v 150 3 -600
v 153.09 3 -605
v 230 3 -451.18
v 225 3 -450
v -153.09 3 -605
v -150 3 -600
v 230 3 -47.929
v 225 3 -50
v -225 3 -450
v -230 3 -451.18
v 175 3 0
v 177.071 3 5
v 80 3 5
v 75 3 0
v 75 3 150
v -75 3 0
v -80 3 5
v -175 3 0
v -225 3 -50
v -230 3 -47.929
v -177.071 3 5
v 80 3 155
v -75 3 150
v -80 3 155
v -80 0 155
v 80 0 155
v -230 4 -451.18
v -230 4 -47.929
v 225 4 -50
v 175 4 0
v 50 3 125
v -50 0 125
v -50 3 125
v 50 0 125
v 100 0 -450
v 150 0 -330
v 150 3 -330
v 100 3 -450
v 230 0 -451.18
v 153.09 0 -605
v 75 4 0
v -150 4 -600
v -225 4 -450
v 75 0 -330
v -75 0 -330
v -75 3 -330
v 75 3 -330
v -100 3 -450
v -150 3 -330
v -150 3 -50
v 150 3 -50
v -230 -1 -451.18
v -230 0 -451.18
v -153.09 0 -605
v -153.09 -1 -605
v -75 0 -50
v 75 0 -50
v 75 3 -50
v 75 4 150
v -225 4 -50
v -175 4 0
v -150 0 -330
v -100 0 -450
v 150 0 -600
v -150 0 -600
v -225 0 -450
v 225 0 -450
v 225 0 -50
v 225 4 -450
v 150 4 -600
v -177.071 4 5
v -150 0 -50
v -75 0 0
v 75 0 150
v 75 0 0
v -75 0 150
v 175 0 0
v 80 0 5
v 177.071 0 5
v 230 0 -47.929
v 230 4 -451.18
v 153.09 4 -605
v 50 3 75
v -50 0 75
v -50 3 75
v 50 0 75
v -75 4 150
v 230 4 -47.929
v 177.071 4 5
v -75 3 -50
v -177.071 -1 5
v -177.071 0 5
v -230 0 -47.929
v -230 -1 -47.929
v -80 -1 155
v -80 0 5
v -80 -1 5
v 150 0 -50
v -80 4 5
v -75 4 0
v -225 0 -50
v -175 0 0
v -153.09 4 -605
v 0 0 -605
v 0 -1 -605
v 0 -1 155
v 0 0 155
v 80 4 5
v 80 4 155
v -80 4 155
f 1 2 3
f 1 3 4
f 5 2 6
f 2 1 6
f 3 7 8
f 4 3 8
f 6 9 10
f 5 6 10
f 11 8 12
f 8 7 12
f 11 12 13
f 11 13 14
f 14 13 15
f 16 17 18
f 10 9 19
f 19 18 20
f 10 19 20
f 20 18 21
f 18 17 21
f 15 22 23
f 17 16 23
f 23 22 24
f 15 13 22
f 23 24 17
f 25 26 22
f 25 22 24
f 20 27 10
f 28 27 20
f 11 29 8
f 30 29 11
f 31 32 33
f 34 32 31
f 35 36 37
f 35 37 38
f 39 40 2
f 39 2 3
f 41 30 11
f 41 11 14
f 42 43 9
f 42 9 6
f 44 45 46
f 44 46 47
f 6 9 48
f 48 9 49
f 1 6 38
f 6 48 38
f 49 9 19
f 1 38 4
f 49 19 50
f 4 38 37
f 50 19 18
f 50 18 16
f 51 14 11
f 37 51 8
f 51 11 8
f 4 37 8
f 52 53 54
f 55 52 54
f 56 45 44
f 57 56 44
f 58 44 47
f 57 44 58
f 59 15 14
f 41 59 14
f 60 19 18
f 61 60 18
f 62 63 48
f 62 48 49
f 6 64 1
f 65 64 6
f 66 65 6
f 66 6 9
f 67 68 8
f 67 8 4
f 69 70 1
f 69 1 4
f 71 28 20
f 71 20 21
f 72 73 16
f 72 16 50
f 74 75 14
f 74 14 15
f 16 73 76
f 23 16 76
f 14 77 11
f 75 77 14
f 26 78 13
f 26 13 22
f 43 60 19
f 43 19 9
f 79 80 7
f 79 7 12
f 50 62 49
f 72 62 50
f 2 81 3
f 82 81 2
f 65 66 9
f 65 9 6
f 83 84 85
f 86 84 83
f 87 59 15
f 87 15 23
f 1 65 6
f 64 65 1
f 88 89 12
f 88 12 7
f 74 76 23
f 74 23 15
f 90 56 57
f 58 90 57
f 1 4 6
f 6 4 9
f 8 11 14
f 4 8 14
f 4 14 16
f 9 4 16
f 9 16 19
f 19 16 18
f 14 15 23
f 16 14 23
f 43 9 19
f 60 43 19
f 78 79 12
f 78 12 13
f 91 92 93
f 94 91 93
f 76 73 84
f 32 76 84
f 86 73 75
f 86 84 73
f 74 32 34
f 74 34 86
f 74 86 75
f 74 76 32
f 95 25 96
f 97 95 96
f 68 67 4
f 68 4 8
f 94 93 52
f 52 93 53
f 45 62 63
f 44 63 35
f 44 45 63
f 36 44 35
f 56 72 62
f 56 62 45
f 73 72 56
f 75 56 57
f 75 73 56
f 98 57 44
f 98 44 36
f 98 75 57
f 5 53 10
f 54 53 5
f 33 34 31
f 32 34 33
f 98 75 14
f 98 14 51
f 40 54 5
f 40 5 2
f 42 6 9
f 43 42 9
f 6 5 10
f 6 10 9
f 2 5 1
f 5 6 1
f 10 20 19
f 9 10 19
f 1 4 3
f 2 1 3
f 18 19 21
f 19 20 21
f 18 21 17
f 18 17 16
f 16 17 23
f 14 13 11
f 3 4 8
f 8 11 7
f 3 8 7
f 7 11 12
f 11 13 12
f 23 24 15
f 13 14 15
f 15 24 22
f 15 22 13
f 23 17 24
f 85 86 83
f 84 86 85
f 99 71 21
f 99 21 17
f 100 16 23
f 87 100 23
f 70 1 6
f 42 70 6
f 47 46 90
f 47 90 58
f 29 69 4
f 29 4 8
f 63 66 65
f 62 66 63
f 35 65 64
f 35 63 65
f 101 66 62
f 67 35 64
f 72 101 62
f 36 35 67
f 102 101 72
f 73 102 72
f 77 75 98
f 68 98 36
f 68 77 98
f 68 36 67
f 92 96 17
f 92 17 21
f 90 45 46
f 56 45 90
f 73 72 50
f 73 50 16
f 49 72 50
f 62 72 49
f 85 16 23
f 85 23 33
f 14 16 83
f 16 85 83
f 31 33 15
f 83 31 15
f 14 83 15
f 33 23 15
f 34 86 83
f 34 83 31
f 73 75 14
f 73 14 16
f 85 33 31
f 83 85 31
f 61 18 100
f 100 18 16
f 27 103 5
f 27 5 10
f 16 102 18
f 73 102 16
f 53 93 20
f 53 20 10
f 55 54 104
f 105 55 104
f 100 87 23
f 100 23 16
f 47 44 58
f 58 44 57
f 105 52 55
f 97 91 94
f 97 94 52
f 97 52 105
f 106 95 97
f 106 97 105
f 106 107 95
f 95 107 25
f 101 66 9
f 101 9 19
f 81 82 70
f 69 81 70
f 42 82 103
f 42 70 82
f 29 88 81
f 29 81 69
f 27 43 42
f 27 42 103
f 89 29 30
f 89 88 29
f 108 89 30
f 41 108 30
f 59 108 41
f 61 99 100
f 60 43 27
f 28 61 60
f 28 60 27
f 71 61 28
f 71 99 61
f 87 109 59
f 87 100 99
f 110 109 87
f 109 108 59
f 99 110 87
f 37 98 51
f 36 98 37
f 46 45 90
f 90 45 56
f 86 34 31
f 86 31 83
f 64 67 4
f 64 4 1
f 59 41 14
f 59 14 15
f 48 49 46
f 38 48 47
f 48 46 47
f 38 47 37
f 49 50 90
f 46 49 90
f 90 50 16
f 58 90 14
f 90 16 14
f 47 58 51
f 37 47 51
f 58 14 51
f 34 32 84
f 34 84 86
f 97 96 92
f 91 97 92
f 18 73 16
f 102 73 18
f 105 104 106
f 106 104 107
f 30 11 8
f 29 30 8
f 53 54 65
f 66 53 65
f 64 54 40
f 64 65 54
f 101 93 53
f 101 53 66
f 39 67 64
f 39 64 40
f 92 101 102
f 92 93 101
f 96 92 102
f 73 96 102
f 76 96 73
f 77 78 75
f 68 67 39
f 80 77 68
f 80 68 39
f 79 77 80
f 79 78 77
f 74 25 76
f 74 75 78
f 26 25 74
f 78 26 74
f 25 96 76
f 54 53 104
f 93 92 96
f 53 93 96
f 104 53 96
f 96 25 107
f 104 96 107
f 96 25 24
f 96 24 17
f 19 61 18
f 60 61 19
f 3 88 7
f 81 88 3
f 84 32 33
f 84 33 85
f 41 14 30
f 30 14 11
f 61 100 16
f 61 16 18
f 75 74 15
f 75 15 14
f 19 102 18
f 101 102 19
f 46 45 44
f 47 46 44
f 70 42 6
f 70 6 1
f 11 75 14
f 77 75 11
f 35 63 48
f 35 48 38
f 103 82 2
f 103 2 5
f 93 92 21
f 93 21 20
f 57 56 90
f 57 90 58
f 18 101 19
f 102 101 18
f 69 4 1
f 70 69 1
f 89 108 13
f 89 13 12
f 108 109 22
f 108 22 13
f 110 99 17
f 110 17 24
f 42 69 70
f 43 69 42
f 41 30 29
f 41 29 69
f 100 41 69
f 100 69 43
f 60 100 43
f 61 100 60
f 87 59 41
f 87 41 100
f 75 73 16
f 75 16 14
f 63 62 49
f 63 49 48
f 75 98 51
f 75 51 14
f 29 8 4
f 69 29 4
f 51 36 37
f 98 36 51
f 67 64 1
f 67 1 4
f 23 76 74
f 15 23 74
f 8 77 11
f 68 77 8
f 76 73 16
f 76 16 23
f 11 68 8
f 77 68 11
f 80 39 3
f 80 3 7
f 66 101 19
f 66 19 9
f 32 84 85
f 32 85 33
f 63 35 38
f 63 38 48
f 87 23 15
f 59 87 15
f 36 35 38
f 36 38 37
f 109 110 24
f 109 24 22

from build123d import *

# Parameters (mm, degrees)
F1_DEPTH  = 3
F2_W      = 150
F2_H      = 150
F3_DEPTH  = 3
F4_W      = 150
F4_H      = 280
F5_DEPTH  = 3
F6_W      = 150
F6_H      = 280
F7_DEPTH  = 3
F9_DEPTH  = 3
F11_DEPTH = 3
F13_DEPTH = 1
F15_DEPTH = 1
F17_DEPTH = 1


with BuildPart() as f1:
    # F0 (on Front) → F1 (new body)
    with BuildSketch(Plane.XZ):
        Polygon((50, 125), (0, 125), (-50, 125), (-50, 100), (-50, 75), (0, 75), (50, 75), (50, 100), align=None)
    extrude(amount=-F1_DEPTH)


with BuildPart() as f3:
    # F2 (on Front) → F3 (new body)
    with BuildSketch(Plane.XZ):
        with Locations((0, 75)):
            Rectangle(F2_W, F2_H)
        Polygon((-50, 125), (0, 125), (50, 125), (50, 100), (50, 75), (0, 75), (-50, 75), (-50, 100), align=None, mode=Mode.SUBTRACT)
    extrude(amount=-F3_DEPTH)


with BuildPart() as f5:
    # F4 (on Front) → F5 (new body)
    with BuildSketch(Plane.XZ):
        with Locations((0, -190)):
            Rectangle(F4_W, F4_H)
    extrude(amount=-F5_DEPTH)


with BuildPart() as f7:
    # F6 (on Front) → F7 (new body)
    with BuildSketch(Plane.XZ):
        Polygon((75, 0), (-75, 0), (-150, -50), (-150, -330), (-100, -450), (100, -450), (150, -330), (150, -50), align=None)
        with Locations((0, -190)):
            Rectangle(F6_W, F6_H, mode=Mode.SUBTRACT)
    extrude(amount=-F7_DEPTH)


with BuildPart() as f9:
    # F8 (on face) → F9 (new body)
    with BuildSketch(Plane.XZ):
        Polygon((175, 0), (75, 0), (150, -50), (150, -330), (100, -450), (-100, -450), (-150, -330), (-150, -50), (-75, 0), (-175, 0), (-225, -50), (-225, -450), (-150, -600), (150, -600), (225, -450), (225, -50), align=None)
    extrude(amount=-F9_DEPTH)


with BuildPart() as f11:
    # F10 (on face) → F11 (new body)
    with BuildSketch(Plane.XZ):
        Polygon((230, -47.928932), (177.071068, 5), (80, 5), (80, 155), (-80, 155), (-80, 5), (-177.071068, 5), (-230, -47.928932), (-230, -451.18034), (-153.09017, -605), (153.09017, -605), (230, -451.18034), align=None)
        Polygon((-75, 150), (75, 150), (75, 0), (175, 0), (225, -50), (225, -450), (150, -600), (-150, -600), (-225, -450), (-225, -50), (-175, 0), (-75, 0), align=None, mode=Mode.SUBTRACT)
    extrude(amount=-F11_DEPTH)


with BuildPart() as f13:
    # F12 (on face) → F13 (new body)
    with BuildSketch(Plane(origin=(0, 3, 0), x_dir=(-1, 0, 0), z_dir=(0, 1, 0))):
        Polygon((75, 0), (75, 150), (-75, 150), (-75, 0), (-175, 0), (-225, -50), (-225, -450), (-150, -600), (150, -600), (225, -450), (225, -50), (175, 0), align=None)
    extrude(amount=F13_DEPTH)


with BuildPart() as f15:
    # F14 (on face) → F15 (new body)
    with BuildSketch(Plane(origin=(0, 4, 0), x_dir=(-1, 0, 0), z_dir=(0, 1, 0))):
        Polygon((80, 155), (-80, 155), (-80, 5), (-177.071068, 5), (-230, -47.928932), (-230, -451.18034), (-153.09017, -605), (153.09017, -605), (230, -451.18034), (230, -47.928932), (177.071068, 5), (80, 5), align=None)
        Polygon((-75, 0), (-75, 150), (75, 150), (75, 0), (175, 0), (225, -50), (225, -450), (150, -600), (-150, -600), (-225, -450), (-225, -50), (-175, 0), align=None, mode=Mode.SUBTRACT)
    extrude(amount=-F15_DEPTH)


with BuildPart() as f17:
    # F16 (on face) → F17 (new body)
    with BuildSketch(Plane.XZ):
        Polygon((-153.09017, -605), (0, -605), (0, 155), (-80, 155), (-80, 5), (-177.071068, 5), (-230, -47.928932), (-230, -451.18034), align=None)
    extrude(amount=F17_DEPTH)


solid = Compound([f1.part, f3.part, f5.part, f7.part, f9.part, f11.part, f13.part, f15.part, f17.part])
